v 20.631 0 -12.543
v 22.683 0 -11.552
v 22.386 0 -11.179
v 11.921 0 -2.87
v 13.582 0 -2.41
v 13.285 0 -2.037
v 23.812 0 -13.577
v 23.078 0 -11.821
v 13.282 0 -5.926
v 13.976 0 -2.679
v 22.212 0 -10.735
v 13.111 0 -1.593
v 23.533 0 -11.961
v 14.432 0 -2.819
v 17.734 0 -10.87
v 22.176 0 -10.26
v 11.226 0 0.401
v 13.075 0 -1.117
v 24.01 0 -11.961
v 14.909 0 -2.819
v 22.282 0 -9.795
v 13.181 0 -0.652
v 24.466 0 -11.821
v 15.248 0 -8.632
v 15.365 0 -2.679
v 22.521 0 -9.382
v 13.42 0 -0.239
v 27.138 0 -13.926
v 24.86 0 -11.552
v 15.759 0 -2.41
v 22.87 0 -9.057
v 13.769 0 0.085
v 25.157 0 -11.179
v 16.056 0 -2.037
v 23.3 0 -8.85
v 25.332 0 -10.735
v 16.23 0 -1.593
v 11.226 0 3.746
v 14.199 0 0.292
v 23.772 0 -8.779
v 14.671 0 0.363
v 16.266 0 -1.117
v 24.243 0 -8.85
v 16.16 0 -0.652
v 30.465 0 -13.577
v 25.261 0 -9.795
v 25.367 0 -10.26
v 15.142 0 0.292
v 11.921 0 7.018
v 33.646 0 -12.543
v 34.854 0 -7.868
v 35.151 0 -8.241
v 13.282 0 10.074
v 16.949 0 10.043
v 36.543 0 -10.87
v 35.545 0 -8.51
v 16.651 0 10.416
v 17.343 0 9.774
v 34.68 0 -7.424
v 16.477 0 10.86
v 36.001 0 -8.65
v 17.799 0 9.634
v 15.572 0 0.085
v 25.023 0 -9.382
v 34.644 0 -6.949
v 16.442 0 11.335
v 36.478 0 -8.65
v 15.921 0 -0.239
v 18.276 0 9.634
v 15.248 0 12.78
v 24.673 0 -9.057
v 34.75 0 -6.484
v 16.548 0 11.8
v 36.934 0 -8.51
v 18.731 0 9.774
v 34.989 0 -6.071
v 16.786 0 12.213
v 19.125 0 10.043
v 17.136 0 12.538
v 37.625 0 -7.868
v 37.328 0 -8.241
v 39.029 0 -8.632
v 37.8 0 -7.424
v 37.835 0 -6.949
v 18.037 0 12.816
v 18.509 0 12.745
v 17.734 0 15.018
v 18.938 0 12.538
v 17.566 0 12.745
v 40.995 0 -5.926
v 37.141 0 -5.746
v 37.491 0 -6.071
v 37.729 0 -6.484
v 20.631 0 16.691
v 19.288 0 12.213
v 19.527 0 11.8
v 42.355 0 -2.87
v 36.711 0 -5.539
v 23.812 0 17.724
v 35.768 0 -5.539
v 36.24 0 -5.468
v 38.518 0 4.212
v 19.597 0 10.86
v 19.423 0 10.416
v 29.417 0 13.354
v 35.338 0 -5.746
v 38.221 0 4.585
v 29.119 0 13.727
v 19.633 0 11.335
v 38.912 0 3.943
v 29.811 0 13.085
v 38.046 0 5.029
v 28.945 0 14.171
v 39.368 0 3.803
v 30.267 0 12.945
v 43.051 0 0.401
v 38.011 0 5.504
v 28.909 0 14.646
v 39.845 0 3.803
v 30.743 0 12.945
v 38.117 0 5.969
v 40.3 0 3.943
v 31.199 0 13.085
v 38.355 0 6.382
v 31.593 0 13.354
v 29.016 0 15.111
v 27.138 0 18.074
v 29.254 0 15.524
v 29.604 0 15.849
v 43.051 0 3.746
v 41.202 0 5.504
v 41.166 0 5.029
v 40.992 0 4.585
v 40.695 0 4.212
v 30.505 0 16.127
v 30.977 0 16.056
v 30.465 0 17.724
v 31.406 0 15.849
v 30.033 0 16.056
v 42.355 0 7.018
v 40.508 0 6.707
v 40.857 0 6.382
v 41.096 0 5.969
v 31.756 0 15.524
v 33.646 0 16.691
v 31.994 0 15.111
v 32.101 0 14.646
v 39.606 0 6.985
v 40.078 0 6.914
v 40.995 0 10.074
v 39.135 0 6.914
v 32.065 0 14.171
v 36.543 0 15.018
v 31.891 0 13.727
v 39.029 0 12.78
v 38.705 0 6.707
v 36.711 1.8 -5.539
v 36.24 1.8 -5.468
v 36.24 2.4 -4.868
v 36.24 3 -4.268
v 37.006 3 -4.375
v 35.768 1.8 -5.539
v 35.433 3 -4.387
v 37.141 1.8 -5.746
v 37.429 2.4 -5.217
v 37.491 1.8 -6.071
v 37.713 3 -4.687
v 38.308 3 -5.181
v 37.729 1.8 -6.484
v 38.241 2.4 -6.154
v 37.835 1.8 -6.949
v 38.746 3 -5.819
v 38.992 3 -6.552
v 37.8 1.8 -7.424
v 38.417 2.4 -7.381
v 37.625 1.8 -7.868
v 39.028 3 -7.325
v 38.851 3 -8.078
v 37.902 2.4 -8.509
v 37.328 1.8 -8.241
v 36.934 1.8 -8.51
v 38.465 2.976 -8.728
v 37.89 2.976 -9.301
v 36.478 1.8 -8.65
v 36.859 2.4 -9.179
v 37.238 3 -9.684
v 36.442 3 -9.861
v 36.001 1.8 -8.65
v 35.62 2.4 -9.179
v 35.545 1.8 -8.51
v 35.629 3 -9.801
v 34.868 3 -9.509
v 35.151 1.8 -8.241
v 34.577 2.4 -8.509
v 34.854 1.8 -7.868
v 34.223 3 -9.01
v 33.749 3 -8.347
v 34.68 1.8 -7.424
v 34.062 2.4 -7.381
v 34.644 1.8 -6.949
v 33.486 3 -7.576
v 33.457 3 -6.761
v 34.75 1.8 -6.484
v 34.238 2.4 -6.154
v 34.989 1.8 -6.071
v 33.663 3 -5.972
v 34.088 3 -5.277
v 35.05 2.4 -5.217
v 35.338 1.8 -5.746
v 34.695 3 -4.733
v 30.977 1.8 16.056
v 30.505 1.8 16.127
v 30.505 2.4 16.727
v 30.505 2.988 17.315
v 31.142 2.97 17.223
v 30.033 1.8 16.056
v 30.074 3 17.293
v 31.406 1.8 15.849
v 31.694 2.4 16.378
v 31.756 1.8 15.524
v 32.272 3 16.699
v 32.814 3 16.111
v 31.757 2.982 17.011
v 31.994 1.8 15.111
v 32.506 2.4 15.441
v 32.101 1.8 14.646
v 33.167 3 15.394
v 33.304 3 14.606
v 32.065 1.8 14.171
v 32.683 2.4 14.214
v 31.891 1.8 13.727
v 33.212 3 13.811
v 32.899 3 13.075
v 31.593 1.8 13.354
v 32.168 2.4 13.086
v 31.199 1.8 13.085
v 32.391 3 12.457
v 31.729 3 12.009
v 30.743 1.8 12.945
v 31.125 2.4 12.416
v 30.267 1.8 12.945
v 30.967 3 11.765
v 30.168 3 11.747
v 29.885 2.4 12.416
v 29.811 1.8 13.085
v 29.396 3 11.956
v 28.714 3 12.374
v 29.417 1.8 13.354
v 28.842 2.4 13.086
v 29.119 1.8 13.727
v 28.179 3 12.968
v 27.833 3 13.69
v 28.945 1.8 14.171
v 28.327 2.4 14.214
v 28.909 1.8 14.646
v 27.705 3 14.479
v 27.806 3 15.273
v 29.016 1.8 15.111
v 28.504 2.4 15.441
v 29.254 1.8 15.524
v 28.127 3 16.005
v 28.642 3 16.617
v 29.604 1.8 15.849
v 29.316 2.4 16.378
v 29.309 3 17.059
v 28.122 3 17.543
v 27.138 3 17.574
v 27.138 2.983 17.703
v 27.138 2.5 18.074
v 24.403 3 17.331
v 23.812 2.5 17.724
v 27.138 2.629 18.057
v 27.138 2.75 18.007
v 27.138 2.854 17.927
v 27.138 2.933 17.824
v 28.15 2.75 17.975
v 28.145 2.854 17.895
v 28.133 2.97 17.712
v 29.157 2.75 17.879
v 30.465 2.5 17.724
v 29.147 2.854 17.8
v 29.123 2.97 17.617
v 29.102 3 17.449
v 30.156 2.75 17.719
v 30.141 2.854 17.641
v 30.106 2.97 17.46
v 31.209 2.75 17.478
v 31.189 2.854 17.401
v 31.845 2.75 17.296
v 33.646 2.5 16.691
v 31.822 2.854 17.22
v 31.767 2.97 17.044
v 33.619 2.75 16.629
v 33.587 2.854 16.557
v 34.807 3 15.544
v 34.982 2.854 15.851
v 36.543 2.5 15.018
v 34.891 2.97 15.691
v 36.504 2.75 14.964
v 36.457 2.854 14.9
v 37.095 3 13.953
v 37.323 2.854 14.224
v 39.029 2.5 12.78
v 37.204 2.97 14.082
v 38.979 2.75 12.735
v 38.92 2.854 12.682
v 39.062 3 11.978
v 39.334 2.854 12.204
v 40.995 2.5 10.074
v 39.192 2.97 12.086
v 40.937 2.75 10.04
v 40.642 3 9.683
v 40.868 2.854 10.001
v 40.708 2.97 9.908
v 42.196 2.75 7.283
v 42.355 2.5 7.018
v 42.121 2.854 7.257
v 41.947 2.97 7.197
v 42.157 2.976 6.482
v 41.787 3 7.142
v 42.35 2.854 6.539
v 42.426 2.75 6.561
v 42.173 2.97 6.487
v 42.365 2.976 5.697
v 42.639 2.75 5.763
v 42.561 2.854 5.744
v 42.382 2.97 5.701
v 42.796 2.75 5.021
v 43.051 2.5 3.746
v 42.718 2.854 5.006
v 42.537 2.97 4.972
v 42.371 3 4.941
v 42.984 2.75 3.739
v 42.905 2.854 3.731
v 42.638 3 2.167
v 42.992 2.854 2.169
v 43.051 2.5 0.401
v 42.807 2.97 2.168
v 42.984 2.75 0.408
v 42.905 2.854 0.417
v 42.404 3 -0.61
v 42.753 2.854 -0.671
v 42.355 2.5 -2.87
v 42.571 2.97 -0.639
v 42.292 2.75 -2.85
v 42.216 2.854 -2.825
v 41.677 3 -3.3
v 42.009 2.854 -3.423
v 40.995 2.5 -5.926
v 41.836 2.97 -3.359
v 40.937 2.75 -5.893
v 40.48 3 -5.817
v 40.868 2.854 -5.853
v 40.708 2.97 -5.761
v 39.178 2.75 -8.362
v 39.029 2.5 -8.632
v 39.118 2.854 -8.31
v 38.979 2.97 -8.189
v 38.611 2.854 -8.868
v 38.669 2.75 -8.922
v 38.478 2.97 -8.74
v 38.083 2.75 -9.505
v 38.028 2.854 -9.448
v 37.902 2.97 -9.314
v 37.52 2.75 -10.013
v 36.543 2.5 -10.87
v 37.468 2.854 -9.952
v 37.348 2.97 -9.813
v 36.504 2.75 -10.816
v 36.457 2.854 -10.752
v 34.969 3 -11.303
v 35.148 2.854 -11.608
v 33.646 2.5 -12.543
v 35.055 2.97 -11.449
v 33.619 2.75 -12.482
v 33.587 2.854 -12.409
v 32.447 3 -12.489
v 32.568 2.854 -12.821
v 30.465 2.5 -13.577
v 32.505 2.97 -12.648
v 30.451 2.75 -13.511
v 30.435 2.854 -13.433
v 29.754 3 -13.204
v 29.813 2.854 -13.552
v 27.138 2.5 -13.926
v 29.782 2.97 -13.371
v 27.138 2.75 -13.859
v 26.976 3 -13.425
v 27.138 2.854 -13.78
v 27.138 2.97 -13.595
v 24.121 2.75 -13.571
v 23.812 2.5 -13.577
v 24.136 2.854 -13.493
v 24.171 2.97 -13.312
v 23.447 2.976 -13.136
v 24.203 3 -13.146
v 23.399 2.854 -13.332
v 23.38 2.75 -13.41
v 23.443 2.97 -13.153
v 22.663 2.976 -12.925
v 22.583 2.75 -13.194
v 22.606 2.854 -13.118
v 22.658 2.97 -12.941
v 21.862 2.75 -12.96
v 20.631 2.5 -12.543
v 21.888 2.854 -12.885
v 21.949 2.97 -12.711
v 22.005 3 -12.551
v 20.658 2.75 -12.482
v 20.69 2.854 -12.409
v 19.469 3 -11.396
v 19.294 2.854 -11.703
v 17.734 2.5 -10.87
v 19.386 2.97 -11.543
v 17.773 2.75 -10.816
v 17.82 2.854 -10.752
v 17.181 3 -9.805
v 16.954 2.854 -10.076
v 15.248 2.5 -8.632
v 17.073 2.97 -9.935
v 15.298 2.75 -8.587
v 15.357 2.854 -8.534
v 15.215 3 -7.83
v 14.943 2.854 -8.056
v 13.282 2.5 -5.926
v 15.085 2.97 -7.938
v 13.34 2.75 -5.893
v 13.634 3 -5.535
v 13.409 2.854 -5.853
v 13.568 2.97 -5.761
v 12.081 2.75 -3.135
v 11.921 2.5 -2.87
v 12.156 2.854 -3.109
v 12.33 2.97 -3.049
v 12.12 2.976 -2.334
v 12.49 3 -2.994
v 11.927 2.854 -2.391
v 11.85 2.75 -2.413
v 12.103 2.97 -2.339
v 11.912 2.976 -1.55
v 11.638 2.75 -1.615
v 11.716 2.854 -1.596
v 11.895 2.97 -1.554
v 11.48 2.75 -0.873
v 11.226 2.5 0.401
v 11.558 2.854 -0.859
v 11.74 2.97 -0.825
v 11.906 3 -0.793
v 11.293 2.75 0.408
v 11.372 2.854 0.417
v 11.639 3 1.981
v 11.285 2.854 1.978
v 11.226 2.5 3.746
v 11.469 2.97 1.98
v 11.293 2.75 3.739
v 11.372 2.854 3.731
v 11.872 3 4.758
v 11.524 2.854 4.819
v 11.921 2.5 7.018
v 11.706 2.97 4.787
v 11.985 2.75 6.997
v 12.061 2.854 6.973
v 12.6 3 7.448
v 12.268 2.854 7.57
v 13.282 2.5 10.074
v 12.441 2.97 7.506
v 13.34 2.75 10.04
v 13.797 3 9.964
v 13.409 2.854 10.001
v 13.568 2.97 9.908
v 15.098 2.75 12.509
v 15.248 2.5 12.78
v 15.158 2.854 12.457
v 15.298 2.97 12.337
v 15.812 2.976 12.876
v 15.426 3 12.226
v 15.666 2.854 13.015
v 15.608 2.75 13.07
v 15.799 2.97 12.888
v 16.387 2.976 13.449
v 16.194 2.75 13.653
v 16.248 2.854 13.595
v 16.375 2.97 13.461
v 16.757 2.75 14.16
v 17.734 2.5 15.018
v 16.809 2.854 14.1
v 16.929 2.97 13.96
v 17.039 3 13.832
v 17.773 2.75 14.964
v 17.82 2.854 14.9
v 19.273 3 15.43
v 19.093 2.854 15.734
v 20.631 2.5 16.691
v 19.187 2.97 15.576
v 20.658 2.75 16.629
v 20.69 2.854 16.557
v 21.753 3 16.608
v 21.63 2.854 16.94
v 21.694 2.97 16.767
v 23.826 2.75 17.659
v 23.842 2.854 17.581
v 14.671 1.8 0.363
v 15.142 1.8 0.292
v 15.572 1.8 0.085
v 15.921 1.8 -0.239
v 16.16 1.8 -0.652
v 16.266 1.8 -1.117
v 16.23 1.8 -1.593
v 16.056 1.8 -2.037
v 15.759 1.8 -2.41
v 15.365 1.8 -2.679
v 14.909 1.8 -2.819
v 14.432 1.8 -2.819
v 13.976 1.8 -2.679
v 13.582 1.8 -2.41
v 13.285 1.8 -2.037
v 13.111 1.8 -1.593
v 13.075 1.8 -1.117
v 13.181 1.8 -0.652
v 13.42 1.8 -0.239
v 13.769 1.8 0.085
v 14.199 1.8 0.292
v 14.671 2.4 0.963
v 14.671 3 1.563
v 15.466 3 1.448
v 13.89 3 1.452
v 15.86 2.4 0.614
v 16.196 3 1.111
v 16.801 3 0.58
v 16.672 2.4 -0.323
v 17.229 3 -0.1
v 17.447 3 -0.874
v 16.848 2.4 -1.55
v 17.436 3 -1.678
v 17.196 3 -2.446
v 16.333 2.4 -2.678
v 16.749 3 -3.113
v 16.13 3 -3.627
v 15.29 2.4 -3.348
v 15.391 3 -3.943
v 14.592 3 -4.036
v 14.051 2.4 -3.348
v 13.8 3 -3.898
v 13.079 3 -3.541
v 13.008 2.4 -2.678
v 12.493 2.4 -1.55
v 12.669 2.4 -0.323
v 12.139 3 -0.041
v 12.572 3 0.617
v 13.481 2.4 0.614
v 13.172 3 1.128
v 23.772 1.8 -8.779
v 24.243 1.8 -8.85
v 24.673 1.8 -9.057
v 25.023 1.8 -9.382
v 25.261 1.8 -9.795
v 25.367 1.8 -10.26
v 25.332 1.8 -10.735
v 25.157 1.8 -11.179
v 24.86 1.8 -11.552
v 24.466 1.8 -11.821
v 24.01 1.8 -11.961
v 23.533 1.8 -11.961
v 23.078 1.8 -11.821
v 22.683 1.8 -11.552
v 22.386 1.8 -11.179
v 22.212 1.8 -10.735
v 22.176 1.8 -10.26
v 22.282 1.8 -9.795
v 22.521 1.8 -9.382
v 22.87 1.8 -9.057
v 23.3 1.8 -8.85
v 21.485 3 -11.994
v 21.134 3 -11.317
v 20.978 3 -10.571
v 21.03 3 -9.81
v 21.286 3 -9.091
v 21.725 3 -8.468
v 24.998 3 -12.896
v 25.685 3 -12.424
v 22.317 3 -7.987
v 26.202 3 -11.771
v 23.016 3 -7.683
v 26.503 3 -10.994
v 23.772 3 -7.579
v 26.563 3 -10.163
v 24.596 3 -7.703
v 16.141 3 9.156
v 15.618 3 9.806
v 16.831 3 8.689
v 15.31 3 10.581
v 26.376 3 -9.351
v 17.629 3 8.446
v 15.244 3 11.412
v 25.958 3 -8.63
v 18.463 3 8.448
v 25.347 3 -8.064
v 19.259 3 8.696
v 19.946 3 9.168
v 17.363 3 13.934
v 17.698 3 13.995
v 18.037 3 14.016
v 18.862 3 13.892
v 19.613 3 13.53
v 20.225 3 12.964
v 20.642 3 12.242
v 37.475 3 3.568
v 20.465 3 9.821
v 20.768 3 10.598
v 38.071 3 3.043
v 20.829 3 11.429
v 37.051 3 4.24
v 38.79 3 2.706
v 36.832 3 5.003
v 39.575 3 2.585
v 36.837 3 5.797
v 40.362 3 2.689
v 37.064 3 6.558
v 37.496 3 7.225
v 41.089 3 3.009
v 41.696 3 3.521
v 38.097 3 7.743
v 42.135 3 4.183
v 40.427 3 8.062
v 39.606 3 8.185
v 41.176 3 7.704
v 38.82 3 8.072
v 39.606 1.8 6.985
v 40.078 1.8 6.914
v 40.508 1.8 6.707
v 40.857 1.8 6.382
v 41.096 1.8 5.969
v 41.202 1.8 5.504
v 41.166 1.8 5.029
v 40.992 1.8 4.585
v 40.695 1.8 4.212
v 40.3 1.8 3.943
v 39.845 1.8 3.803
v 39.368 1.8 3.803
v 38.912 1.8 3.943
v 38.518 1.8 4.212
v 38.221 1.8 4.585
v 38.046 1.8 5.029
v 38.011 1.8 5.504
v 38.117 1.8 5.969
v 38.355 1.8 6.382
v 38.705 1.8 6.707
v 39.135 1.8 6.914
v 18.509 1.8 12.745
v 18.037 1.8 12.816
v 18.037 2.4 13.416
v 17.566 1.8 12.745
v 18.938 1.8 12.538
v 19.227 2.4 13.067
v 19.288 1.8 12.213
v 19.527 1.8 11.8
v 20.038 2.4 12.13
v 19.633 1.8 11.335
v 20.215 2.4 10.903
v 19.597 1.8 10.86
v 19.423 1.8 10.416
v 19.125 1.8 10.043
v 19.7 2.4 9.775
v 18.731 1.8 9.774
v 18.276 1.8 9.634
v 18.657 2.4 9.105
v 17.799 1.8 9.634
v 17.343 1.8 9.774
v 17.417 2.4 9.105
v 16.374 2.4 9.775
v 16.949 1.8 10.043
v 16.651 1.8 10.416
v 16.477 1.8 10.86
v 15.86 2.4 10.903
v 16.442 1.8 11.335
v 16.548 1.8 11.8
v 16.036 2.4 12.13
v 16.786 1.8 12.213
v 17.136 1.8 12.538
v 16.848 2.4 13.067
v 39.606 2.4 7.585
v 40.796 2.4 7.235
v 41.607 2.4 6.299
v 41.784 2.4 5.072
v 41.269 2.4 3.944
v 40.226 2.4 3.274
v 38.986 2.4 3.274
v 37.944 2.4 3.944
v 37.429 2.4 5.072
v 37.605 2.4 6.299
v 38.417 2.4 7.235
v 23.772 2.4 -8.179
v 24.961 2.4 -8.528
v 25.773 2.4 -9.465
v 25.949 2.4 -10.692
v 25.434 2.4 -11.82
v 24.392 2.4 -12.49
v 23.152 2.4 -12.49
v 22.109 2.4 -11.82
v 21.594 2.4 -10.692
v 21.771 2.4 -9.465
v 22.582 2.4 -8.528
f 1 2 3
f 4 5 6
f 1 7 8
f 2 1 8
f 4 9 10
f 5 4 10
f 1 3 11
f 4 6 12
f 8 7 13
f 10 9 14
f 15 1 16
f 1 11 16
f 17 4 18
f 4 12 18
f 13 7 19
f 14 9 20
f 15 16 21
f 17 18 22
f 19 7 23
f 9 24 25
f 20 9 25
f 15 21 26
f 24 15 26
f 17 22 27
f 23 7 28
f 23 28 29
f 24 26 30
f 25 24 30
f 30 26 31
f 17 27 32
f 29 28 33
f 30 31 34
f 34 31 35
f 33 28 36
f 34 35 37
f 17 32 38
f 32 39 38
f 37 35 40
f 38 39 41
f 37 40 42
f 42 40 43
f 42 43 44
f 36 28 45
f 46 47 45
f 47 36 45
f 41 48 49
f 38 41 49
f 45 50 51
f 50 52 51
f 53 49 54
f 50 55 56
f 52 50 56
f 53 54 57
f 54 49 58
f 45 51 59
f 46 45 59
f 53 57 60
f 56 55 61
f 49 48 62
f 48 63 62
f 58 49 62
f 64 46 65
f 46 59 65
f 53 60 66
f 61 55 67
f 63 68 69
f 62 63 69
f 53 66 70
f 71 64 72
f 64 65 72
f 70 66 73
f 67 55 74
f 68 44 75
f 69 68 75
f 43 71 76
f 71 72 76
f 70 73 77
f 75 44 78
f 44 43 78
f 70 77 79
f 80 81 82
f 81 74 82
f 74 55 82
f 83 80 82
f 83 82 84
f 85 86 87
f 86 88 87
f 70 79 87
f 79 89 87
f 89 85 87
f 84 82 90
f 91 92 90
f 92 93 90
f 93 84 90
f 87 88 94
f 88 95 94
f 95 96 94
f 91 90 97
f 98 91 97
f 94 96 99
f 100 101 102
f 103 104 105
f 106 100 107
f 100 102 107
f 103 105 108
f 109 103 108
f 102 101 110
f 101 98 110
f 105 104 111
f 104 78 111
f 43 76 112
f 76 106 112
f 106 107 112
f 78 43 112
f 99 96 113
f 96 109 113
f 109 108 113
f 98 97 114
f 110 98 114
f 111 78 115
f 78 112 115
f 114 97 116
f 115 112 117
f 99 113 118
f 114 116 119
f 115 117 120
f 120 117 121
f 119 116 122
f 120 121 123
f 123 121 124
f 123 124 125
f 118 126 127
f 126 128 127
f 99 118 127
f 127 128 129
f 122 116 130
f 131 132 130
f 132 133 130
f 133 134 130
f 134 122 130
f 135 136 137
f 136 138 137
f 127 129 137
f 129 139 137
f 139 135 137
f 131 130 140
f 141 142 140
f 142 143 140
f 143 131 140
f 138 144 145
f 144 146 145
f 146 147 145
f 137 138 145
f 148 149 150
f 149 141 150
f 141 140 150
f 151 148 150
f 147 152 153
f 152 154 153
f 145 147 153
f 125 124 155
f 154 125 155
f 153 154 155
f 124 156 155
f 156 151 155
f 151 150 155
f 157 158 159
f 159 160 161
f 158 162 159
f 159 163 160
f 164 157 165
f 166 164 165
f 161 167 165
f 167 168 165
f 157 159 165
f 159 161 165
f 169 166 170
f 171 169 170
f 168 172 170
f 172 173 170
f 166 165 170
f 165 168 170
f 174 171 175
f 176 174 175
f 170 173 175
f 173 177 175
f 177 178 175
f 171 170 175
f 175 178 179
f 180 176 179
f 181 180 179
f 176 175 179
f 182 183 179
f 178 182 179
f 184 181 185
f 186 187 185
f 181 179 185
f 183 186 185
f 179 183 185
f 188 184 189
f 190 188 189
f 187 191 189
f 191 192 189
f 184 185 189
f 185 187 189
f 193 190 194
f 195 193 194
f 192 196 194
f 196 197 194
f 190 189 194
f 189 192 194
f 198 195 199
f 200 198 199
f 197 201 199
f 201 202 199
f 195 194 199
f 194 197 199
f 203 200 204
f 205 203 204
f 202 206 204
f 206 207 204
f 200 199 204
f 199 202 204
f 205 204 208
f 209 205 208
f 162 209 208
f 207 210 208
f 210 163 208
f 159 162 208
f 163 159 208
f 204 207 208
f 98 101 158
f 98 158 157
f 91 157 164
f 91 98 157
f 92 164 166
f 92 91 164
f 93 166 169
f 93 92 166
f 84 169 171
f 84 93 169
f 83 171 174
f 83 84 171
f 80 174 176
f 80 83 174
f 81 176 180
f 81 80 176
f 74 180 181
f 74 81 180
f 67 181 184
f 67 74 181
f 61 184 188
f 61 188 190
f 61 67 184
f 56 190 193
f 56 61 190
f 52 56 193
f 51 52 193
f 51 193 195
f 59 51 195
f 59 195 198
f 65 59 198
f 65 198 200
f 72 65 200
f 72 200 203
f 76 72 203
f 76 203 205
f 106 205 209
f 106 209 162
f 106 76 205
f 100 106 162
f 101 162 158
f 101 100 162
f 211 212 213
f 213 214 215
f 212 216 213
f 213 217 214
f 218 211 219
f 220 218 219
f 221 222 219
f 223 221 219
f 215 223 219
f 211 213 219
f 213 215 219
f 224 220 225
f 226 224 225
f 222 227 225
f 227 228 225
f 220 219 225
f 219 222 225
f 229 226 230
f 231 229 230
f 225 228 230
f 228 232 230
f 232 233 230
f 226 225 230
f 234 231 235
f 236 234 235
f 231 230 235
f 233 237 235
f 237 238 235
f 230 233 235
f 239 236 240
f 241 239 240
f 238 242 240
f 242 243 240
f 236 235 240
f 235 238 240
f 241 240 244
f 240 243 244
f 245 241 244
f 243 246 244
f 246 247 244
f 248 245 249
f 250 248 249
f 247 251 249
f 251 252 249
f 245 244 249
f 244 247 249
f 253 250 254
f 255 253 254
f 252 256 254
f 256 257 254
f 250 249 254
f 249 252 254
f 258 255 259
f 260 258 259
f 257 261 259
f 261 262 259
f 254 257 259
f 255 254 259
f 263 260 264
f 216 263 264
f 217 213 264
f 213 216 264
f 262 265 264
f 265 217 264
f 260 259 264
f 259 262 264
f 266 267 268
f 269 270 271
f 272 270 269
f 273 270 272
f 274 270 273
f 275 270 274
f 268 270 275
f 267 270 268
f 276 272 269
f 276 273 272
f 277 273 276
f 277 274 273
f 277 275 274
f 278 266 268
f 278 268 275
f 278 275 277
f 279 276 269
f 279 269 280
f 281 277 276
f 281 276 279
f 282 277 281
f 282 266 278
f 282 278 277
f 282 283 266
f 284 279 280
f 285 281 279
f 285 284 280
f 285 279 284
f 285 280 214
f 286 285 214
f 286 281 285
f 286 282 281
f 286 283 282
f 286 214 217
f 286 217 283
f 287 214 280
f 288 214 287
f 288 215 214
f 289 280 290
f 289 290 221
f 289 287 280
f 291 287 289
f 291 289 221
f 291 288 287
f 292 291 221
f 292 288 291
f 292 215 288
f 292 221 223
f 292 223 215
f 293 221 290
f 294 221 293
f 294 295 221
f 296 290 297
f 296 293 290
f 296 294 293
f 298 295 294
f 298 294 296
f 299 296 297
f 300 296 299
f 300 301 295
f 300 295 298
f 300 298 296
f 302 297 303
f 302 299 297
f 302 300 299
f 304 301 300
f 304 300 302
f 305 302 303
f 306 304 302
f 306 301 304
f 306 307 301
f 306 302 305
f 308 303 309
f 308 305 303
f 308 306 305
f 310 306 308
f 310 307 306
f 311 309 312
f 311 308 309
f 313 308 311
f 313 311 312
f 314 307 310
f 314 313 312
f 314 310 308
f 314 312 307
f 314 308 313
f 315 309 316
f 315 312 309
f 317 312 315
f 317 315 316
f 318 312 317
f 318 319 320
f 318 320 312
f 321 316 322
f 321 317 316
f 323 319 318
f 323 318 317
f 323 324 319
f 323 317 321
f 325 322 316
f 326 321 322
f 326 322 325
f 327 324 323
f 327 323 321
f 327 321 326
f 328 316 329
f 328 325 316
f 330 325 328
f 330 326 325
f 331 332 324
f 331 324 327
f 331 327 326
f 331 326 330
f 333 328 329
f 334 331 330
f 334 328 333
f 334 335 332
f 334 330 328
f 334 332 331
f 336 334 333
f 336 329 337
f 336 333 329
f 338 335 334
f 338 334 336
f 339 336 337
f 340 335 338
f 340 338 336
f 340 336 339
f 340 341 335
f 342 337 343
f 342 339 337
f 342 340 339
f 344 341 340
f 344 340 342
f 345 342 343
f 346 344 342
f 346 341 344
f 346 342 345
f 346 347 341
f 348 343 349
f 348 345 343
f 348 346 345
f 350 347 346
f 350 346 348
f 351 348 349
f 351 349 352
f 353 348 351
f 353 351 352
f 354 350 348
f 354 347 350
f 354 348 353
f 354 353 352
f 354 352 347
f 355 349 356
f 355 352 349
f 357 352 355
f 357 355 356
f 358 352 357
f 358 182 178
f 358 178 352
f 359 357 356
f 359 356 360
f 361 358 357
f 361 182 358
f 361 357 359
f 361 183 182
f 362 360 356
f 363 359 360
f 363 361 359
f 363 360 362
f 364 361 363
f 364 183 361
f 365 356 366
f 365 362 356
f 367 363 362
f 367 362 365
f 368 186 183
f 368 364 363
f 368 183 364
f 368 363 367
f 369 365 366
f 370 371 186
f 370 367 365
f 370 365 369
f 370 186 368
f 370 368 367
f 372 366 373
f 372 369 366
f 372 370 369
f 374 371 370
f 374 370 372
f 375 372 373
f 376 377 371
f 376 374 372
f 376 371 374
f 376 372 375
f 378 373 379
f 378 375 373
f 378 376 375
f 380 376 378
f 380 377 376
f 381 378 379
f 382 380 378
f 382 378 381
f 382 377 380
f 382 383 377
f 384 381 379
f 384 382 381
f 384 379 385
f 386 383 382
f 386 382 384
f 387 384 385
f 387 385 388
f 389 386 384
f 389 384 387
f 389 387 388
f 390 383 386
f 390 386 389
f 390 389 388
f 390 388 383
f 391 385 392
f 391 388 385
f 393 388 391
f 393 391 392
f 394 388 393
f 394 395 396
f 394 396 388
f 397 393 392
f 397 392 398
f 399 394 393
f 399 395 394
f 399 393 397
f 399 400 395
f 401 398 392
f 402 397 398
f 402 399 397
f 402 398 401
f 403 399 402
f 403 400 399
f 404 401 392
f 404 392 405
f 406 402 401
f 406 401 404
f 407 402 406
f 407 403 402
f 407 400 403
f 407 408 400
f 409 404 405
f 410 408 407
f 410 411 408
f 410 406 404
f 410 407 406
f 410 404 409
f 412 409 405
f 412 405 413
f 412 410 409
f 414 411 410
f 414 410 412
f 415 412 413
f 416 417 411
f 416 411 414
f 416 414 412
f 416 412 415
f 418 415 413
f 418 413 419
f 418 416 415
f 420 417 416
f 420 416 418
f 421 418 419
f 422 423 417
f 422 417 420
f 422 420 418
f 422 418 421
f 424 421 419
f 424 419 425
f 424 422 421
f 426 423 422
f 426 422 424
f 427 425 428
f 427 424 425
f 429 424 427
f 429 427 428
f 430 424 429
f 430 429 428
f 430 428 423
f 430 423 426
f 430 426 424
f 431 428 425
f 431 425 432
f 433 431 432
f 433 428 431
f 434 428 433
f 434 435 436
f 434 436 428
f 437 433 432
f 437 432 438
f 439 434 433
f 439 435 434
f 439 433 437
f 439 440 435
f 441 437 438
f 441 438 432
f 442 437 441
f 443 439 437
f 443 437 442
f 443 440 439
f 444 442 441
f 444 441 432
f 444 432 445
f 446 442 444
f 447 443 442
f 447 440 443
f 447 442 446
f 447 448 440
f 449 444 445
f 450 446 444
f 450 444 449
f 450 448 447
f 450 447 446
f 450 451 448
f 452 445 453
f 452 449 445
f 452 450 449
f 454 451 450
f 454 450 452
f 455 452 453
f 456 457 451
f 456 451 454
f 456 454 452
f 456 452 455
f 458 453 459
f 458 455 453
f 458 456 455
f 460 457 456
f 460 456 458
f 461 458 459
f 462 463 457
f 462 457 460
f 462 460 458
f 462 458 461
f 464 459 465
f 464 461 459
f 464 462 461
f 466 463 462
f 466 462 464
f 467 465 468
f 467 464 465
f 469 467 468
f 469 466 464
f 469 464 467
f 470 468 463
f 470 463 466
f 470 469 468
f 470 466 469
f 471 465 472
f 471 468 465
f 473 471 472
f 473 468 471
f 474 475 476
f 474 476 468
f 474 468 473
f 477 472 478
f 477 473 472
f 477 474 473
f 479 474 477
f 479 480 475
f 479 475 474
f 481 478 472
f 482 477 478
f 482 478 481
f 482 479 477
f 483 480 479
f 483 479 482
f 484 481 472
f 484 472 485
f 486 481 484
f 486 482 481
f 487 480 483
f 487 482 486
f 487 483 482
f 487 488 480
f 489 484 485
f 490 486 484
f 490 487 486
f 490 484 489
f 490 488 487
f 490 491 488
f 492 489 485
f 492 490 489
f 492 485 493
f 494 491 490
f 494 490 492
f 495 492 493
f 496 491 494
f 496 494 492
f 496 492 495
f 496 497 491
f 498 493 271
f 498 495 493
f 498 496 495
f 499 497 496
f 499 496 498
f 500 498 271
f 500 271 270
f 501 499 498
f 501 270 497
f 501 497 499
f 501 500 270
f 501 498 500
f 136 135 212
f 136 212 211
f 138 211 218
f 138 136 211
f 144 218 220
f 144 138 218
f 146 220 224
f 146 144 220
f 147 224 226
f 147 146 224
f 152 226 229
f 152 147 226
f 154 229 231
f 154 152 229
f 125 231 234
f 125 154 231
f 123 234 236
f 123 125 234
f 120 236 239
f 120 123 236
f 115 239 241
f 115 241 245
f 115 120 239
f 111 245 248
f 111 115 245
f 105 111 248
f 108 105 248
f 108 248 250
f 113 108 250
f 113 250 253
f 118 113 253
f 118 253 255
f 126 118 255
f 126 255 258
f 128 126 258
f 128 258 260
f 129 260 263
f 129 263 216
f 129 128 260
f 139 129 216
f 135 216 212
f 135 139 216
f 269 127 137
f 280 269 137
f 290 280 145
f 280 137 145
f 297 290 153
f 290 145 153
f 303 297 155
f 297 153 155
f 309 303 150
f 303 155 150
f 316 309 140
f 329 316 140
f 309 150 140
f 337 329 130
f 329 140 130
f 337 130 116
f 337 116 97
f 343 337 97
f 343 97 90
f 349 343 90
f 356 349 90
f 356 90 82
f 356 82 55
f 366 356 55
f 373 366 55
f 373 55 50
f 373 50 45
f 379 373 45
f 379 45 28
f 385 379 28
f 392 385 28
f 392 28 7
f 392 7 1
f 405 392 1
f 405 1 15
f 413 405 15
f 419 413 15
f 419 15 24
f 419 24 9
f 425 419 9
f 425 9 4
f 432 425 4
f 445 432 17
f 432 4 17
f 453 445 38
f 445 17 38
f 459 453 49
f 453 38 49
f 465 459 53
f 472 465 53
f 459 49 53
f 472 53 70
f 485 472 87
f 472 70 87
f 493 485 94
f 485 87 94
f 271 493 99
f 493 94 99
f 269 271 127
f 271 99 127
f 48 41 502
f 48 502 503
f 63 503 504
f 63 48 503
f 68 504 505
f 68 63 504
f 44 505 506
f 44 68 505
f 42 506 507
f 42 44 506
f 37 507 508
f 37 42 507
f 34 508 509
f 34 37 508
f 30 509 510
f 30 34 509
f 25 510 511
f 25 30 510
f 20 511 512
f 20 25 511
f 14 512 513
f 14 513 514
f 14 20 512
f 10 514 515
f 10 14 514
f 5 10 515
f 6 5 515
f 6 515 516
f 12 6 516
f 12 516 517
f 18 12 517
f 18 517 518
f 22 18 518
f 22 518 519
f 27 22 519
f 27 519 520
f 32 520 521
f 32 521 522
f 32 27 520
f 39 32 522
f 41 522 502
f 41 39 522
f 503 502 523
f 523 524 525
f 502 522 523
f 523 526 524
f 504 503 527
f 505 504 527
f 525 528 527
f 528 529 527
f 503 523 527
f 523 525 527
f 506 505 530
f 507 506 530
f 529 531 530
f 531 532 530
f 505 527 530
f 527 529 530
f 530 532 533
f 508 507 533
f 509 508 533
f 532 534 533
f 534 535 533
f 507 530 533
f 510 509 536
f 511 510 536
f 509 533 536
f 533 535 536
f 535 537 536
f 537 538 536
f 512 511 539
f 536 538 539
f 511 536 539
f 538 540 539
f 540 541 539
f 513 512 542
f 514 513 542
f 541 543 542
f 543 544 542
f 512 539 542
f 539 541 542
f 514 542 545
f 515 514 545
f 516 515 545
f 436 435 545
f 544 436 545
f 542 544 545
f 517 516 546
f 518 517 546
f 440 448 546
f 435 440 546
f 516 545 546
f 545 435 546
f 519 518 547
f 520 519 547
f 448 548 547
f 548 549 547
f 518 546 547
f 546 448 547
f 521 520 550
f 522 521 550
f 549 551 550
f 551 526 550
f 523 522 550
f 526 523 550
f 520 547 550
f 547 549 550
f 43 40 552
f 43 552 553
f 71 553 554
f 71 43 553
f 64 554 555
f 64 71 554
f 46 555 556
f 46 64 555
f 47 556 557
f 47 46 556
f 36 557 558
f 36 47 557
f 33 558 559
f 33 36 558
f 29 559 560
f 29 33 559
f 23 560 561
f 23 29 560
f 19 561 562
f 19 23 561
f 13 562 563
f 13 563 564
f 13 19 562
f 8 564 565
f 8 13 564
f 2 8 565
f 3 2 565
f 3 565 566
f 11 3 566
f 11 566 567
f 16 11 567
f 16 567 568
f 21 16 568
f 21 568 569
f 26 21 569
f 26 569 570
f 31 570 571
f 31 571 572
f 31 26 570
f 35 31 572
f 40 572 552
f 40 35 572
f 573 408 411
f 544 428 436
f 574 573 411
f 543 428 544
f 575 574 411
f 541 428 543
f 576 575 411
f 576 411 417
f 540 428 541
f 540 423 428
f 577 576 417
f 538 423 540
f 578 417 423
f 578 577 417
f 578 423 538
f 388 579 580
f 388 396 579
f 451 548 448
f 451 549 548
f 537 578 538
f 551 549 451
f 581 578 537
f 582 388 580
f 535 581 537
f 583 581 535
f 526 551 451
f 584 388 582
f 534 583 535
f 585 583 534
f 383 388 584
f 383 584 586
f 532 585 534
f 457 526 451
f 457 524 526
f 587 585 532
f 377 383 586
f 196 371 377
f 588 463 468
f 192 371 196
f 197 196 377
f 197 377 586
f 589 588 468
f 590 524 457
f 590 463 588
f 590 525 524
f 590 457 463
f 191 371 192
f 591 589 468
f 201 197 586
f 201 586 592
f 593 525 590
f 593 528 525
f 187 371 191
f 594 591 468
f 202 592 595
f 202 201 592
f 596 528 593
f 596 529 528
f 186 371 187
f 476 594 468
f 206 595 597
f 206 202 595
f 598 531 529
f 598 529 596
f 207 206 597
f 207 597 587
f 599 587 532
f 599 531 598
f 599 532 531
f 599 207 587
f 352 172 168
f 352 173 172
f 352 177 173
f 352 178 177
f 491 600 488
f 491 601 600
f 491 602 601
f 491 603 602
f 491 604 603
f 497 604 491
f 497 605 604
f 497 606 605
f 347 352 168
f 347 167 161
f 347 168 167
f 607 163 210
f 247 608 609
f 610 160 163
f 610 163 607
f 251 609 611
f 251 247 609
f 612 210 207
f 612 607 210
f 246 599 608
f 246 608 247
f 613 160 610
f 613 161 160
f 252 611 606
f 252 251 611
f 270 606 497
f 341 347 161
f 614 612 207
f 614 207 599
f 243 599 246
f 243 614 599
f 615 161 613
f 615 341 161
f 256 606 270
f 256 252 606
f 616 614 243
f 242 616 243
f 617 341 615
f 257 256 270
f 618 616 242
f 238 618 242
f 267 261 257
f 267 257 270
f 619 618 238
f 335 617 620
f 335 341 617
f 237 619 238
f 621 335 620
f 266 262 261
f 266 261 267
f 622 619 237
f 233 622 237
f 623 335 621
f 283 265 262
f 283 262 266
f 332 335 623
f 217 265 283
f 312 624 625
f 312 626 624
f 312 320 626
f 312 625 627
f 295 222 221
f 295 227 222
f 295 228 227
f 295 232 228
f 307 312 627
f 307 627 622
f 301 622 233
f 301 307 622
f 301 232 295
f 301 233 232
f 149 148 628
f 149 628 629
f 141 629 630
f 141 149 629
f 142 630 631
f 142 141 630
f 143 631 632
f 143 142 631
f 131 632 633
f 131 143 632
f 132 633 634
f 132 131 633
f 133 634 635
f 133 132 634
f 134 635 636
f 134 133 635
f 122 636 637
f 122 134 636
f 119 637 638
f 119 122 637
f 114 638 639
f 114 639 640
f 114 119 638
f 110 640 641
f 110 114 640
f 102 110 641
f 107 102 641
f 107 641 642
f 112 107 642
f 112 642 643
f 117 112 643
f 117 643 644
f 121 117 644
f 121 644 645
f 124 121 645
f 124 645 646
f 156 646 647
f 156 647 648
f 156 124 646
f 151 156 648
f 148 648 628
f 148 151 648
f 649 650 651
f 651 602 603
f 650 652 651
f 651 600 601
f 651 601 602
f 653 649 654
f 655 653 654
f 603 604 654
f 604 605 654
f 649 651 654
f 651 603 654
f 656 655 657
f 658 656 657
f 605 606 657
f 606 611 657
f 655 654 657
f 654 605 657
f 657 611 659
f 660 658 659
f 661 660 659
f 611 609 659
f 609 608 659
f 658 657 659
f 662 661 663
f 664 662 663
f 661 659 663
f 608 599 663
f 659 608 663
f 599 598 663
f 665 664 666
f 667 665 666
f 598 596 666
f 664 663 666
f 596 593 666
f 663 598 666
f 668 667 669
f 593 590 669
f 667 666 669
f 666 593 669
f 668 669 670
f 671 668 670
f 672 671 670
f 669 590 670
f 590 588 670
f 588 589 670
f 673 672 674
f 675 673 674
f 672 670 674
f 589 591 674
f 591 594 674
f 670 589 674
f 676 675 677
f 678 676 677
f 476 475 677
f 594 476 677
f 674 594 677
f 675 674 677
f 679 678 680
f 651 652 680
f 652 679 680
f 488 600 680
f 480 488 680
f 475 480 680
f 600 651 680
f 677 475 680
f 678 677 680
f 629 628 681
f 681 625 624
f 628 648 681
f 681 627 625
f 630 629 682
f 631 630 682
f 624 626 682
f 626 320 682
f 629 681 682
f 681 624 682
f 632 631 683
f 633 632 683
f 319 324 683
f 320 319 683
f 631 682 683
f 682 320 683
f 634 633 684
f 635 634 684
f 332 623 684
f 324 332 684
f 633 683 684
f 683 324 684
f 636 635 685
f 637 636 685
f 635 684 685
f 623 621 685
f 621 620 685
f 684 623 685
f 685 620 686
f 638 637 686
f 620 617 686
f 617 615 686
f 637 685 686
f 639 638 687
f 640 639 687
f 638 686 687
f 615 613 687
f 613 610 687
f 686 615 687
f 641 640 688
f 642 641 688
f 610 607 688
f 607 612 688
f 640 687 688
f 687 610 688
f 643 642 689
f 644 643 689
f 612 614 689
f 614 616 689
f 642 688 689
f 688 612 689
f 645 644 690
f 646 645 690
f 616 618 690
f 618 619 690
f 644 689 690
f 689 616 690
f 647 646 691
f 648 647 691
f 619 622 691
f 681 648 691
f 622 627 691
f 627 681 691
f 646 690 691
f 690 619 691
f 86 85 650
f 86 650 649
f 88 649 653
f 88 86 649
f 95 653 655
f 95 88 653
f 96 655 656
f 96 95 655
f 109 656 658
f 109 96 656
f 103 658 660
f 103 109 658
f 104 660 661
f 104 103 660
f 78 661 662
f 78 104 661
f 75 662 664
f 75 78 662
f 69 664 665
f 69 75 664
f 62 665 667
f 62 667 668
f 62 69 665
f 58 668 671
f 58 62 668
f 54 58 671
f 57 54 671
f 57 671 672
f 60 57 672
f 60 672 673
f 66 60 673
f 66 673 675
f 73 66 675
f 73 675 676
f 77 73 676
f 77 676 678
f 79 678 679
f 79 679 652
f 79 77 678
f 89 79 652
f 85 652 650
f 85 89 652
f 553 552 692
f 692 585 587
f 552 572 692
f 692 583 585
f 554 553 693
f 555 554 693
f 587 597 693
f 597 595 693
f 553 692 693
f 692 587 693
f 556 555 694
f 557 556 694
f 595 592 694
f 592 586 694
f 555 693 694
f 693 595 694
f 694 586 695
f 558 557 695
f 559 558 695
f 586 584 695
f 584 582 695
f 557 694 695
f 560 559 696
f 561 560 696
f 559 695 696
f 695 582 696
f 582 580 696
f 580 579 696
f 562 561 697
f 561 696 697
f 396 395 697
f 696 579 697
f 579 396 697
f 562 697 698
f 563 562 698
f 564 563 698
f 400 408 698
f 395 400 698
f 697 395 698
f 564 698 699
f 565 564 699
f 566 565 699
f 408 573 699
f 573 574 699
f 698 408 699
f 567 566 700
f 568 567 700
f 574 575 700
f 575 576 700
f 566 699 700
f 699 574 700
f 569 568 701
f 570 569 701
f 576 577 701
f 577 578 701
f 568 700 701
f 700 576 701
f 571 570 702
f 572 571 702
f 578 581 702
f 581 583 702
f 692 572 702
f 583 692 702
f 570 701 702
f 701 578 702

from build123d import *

# Parameters (mm, degrees)
SKETCH1_R           = 16
SKETCH1_R_2         = 1.6
BOSS_EXTRUDE1_DEPTH = 3
CHAMFER1_SIZE       = 1.2
FILLET1_R           = 0.5


with BuildPart() as part:
    # Sketch1 → Boss-Extrude1 (new body)
    with BuildSketch(Plane(origin=(0, 0, 0), x_dir=(1, 0, 0), z_dir=(0, 1, 0))):
        with Locations(Location((27.13838664, -2.073844751, 0), (0, 0, 270))):
            Circle(SKETCH1_R)
        with Locations(Location((23.771761103, 10.379099981, 0), (0, 0, 270))):
            Circle(SKETCH1_R_2, mode=Mode.SUBTRACT)
        with Locations(Location((36.239640361, 7.068210855, 0), (0, 0, 270))):
            Circle(SKETCH1_R_2, mode=Mode.SUBTRACT)
        with Locations(Location((39.606265898, -5.384733876, 0), (0, 0, 270))):
            Circle(SKETCH1_R_2, mode=Mode.SUBTRACT)
        with Locations(Location((30.505012177, -14.526789483, 0), (0, 0, 270))):
            Circle(SKETCH1_R_2, mode=Mode.SUBTRACT)
        with Locations(Location((18.037132919, -11.215900357, 0), (0, 0, 270))):
            Circle(SKETCH1_R_2, mode=Mode.SUBTRACT)
        with Locations(Location((14.670507382, 1.237044374, 0), (0, 0, 270))):
            Circle(SKETCH1_R_2, mode=Mode.SUBTRACT)
    extrude(amount=BOSS_EXTRUDE1_DEPTH)

    # Chamfer1
    chamfer1_edges = [part.edges().sort_by_distance(p)[0] for p in [
        (39.606265898, 3, 3.784733876),
        (30.505012177, 3, 12.926789483),
        (18.037132919, 3, 9.615900357),
        (14.670507382, 3, -2.837044374),
        (23.771761103, 3, -11.979099981),
        (36.239640361, 3, -8.668210855),
    ]]
    chamfer(chamfer1_edges, length=CHAMFER1_SIZE)

    # Fillet1
    # the kernel refuses this fillet: 0.5 mm, written as the material it takes off along each edge
    with BuildSketch(Plane(origin=(27.13838664, 3, 2.073844751), x_dir=(0, 0, 1), z_dir=(-1, 0, 0))) as fillet1_piece_1:
        with BuildLine():
            CenterArc((16 - FILLET1_R, -FILLET1_R), FILLET1_R, 0, 90)
            Line((16, -FILLET1_R), (16, 0))
            Line((16, 0), (16 - FILLET1_R, 0))
        make_face()
    revolve(axis=Axis((27.13838664, 3, 2.073844751), (0, 1, 0)), mode=Mode.SUBTRACT)


solid = part.part
